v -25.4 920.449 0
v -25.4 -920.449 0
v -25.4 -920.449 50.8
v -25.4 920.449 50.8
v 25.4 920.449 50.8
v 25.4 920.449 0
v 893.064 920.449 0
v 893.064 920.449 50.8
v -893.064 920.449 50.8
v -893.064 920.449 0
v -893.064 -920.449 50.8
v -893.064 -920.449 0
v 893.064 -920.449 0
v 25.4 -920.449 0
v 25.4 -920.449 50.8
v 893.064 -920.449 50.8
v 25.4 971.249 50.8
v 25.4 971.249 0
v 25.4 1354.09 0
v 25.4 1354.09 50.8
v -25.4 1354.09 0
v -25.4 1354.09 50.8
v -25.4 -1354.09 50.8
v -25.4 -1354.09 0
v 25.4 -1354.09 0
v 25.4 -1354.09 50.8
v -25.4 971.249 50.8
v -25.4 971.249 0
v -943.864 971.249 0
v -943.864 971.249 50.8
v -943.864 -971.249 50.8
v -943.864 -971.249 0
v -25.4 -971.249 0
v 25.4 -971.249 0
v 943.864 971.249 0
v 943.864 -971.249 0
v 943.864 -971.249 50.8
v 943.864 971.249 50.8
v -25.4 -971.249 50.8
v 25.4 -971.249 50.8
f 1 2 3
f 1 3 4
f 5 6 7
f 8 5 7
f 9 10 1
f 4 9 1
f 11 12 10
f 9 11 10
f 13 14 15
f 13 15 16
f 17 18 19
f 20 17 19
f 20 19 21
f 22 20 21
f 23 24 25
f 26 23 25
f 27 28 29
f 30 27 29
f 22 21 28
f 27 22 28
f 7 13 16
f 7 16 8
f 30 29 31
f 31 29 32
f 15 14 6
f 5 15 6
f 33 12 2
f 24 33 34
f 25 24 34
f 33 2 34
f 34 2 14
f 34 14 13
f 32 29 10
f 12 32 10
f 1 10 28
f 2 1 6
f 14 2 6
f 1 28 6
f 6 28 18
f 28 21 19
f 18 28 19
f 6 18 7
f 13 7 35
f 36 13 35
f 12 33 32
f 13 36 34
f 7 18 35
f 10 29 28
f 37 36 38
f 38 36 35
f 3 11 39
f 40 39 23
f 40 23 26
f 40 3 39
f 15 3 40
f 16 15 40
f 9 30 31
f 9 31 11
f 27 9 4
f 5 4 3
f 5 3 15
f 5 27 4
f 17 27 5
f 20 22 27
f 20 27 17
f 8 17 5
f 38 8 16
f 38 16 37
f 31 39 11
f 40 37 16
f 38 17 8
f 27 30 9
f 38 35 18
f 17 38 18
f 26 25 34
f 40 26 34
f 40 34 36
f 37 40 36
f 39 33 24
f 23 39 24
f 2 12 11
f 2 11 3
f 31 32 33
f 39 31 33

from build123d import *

# Parameters (mm, degrees)
F0_W     = 867.664
F0_H     = 1840.898474
F1_DEPTH = 50.8


with BuildPart() as f1:
    # F0 (on Top) → F1 (new body)
    with BuildSketch(Plane.XY):
        Polygon((-893.064, 971.249237), (-943.864, 971.249237), (-943.864, -971.249237), (-893.064, -971.249237), (-25.4, -971.249237), (-25.4, -1354.089795), (25.4, -1354.089795), (25.4, -971.249237), (893.064, -971.249237), (943.864, -971.249237), (943.864, 971.249237), (893.064, 971.249237), (25.4, 971.249237), (25.4, 1354.089795), (-25.4, 1354.089795), (-25.4, 971.249237), align=None)
        with Locations((-459.232, 0)):
            Rectangle(F0_W, F0_H, mode=Mode.SUBTRACT)
        with Locations((459.232, 0)):
            Rectangle(F0_W, F0_H, mode=Mode.SUBTRACT)
    extrude(amount=F1_DEPTH)


solid = f1.part
